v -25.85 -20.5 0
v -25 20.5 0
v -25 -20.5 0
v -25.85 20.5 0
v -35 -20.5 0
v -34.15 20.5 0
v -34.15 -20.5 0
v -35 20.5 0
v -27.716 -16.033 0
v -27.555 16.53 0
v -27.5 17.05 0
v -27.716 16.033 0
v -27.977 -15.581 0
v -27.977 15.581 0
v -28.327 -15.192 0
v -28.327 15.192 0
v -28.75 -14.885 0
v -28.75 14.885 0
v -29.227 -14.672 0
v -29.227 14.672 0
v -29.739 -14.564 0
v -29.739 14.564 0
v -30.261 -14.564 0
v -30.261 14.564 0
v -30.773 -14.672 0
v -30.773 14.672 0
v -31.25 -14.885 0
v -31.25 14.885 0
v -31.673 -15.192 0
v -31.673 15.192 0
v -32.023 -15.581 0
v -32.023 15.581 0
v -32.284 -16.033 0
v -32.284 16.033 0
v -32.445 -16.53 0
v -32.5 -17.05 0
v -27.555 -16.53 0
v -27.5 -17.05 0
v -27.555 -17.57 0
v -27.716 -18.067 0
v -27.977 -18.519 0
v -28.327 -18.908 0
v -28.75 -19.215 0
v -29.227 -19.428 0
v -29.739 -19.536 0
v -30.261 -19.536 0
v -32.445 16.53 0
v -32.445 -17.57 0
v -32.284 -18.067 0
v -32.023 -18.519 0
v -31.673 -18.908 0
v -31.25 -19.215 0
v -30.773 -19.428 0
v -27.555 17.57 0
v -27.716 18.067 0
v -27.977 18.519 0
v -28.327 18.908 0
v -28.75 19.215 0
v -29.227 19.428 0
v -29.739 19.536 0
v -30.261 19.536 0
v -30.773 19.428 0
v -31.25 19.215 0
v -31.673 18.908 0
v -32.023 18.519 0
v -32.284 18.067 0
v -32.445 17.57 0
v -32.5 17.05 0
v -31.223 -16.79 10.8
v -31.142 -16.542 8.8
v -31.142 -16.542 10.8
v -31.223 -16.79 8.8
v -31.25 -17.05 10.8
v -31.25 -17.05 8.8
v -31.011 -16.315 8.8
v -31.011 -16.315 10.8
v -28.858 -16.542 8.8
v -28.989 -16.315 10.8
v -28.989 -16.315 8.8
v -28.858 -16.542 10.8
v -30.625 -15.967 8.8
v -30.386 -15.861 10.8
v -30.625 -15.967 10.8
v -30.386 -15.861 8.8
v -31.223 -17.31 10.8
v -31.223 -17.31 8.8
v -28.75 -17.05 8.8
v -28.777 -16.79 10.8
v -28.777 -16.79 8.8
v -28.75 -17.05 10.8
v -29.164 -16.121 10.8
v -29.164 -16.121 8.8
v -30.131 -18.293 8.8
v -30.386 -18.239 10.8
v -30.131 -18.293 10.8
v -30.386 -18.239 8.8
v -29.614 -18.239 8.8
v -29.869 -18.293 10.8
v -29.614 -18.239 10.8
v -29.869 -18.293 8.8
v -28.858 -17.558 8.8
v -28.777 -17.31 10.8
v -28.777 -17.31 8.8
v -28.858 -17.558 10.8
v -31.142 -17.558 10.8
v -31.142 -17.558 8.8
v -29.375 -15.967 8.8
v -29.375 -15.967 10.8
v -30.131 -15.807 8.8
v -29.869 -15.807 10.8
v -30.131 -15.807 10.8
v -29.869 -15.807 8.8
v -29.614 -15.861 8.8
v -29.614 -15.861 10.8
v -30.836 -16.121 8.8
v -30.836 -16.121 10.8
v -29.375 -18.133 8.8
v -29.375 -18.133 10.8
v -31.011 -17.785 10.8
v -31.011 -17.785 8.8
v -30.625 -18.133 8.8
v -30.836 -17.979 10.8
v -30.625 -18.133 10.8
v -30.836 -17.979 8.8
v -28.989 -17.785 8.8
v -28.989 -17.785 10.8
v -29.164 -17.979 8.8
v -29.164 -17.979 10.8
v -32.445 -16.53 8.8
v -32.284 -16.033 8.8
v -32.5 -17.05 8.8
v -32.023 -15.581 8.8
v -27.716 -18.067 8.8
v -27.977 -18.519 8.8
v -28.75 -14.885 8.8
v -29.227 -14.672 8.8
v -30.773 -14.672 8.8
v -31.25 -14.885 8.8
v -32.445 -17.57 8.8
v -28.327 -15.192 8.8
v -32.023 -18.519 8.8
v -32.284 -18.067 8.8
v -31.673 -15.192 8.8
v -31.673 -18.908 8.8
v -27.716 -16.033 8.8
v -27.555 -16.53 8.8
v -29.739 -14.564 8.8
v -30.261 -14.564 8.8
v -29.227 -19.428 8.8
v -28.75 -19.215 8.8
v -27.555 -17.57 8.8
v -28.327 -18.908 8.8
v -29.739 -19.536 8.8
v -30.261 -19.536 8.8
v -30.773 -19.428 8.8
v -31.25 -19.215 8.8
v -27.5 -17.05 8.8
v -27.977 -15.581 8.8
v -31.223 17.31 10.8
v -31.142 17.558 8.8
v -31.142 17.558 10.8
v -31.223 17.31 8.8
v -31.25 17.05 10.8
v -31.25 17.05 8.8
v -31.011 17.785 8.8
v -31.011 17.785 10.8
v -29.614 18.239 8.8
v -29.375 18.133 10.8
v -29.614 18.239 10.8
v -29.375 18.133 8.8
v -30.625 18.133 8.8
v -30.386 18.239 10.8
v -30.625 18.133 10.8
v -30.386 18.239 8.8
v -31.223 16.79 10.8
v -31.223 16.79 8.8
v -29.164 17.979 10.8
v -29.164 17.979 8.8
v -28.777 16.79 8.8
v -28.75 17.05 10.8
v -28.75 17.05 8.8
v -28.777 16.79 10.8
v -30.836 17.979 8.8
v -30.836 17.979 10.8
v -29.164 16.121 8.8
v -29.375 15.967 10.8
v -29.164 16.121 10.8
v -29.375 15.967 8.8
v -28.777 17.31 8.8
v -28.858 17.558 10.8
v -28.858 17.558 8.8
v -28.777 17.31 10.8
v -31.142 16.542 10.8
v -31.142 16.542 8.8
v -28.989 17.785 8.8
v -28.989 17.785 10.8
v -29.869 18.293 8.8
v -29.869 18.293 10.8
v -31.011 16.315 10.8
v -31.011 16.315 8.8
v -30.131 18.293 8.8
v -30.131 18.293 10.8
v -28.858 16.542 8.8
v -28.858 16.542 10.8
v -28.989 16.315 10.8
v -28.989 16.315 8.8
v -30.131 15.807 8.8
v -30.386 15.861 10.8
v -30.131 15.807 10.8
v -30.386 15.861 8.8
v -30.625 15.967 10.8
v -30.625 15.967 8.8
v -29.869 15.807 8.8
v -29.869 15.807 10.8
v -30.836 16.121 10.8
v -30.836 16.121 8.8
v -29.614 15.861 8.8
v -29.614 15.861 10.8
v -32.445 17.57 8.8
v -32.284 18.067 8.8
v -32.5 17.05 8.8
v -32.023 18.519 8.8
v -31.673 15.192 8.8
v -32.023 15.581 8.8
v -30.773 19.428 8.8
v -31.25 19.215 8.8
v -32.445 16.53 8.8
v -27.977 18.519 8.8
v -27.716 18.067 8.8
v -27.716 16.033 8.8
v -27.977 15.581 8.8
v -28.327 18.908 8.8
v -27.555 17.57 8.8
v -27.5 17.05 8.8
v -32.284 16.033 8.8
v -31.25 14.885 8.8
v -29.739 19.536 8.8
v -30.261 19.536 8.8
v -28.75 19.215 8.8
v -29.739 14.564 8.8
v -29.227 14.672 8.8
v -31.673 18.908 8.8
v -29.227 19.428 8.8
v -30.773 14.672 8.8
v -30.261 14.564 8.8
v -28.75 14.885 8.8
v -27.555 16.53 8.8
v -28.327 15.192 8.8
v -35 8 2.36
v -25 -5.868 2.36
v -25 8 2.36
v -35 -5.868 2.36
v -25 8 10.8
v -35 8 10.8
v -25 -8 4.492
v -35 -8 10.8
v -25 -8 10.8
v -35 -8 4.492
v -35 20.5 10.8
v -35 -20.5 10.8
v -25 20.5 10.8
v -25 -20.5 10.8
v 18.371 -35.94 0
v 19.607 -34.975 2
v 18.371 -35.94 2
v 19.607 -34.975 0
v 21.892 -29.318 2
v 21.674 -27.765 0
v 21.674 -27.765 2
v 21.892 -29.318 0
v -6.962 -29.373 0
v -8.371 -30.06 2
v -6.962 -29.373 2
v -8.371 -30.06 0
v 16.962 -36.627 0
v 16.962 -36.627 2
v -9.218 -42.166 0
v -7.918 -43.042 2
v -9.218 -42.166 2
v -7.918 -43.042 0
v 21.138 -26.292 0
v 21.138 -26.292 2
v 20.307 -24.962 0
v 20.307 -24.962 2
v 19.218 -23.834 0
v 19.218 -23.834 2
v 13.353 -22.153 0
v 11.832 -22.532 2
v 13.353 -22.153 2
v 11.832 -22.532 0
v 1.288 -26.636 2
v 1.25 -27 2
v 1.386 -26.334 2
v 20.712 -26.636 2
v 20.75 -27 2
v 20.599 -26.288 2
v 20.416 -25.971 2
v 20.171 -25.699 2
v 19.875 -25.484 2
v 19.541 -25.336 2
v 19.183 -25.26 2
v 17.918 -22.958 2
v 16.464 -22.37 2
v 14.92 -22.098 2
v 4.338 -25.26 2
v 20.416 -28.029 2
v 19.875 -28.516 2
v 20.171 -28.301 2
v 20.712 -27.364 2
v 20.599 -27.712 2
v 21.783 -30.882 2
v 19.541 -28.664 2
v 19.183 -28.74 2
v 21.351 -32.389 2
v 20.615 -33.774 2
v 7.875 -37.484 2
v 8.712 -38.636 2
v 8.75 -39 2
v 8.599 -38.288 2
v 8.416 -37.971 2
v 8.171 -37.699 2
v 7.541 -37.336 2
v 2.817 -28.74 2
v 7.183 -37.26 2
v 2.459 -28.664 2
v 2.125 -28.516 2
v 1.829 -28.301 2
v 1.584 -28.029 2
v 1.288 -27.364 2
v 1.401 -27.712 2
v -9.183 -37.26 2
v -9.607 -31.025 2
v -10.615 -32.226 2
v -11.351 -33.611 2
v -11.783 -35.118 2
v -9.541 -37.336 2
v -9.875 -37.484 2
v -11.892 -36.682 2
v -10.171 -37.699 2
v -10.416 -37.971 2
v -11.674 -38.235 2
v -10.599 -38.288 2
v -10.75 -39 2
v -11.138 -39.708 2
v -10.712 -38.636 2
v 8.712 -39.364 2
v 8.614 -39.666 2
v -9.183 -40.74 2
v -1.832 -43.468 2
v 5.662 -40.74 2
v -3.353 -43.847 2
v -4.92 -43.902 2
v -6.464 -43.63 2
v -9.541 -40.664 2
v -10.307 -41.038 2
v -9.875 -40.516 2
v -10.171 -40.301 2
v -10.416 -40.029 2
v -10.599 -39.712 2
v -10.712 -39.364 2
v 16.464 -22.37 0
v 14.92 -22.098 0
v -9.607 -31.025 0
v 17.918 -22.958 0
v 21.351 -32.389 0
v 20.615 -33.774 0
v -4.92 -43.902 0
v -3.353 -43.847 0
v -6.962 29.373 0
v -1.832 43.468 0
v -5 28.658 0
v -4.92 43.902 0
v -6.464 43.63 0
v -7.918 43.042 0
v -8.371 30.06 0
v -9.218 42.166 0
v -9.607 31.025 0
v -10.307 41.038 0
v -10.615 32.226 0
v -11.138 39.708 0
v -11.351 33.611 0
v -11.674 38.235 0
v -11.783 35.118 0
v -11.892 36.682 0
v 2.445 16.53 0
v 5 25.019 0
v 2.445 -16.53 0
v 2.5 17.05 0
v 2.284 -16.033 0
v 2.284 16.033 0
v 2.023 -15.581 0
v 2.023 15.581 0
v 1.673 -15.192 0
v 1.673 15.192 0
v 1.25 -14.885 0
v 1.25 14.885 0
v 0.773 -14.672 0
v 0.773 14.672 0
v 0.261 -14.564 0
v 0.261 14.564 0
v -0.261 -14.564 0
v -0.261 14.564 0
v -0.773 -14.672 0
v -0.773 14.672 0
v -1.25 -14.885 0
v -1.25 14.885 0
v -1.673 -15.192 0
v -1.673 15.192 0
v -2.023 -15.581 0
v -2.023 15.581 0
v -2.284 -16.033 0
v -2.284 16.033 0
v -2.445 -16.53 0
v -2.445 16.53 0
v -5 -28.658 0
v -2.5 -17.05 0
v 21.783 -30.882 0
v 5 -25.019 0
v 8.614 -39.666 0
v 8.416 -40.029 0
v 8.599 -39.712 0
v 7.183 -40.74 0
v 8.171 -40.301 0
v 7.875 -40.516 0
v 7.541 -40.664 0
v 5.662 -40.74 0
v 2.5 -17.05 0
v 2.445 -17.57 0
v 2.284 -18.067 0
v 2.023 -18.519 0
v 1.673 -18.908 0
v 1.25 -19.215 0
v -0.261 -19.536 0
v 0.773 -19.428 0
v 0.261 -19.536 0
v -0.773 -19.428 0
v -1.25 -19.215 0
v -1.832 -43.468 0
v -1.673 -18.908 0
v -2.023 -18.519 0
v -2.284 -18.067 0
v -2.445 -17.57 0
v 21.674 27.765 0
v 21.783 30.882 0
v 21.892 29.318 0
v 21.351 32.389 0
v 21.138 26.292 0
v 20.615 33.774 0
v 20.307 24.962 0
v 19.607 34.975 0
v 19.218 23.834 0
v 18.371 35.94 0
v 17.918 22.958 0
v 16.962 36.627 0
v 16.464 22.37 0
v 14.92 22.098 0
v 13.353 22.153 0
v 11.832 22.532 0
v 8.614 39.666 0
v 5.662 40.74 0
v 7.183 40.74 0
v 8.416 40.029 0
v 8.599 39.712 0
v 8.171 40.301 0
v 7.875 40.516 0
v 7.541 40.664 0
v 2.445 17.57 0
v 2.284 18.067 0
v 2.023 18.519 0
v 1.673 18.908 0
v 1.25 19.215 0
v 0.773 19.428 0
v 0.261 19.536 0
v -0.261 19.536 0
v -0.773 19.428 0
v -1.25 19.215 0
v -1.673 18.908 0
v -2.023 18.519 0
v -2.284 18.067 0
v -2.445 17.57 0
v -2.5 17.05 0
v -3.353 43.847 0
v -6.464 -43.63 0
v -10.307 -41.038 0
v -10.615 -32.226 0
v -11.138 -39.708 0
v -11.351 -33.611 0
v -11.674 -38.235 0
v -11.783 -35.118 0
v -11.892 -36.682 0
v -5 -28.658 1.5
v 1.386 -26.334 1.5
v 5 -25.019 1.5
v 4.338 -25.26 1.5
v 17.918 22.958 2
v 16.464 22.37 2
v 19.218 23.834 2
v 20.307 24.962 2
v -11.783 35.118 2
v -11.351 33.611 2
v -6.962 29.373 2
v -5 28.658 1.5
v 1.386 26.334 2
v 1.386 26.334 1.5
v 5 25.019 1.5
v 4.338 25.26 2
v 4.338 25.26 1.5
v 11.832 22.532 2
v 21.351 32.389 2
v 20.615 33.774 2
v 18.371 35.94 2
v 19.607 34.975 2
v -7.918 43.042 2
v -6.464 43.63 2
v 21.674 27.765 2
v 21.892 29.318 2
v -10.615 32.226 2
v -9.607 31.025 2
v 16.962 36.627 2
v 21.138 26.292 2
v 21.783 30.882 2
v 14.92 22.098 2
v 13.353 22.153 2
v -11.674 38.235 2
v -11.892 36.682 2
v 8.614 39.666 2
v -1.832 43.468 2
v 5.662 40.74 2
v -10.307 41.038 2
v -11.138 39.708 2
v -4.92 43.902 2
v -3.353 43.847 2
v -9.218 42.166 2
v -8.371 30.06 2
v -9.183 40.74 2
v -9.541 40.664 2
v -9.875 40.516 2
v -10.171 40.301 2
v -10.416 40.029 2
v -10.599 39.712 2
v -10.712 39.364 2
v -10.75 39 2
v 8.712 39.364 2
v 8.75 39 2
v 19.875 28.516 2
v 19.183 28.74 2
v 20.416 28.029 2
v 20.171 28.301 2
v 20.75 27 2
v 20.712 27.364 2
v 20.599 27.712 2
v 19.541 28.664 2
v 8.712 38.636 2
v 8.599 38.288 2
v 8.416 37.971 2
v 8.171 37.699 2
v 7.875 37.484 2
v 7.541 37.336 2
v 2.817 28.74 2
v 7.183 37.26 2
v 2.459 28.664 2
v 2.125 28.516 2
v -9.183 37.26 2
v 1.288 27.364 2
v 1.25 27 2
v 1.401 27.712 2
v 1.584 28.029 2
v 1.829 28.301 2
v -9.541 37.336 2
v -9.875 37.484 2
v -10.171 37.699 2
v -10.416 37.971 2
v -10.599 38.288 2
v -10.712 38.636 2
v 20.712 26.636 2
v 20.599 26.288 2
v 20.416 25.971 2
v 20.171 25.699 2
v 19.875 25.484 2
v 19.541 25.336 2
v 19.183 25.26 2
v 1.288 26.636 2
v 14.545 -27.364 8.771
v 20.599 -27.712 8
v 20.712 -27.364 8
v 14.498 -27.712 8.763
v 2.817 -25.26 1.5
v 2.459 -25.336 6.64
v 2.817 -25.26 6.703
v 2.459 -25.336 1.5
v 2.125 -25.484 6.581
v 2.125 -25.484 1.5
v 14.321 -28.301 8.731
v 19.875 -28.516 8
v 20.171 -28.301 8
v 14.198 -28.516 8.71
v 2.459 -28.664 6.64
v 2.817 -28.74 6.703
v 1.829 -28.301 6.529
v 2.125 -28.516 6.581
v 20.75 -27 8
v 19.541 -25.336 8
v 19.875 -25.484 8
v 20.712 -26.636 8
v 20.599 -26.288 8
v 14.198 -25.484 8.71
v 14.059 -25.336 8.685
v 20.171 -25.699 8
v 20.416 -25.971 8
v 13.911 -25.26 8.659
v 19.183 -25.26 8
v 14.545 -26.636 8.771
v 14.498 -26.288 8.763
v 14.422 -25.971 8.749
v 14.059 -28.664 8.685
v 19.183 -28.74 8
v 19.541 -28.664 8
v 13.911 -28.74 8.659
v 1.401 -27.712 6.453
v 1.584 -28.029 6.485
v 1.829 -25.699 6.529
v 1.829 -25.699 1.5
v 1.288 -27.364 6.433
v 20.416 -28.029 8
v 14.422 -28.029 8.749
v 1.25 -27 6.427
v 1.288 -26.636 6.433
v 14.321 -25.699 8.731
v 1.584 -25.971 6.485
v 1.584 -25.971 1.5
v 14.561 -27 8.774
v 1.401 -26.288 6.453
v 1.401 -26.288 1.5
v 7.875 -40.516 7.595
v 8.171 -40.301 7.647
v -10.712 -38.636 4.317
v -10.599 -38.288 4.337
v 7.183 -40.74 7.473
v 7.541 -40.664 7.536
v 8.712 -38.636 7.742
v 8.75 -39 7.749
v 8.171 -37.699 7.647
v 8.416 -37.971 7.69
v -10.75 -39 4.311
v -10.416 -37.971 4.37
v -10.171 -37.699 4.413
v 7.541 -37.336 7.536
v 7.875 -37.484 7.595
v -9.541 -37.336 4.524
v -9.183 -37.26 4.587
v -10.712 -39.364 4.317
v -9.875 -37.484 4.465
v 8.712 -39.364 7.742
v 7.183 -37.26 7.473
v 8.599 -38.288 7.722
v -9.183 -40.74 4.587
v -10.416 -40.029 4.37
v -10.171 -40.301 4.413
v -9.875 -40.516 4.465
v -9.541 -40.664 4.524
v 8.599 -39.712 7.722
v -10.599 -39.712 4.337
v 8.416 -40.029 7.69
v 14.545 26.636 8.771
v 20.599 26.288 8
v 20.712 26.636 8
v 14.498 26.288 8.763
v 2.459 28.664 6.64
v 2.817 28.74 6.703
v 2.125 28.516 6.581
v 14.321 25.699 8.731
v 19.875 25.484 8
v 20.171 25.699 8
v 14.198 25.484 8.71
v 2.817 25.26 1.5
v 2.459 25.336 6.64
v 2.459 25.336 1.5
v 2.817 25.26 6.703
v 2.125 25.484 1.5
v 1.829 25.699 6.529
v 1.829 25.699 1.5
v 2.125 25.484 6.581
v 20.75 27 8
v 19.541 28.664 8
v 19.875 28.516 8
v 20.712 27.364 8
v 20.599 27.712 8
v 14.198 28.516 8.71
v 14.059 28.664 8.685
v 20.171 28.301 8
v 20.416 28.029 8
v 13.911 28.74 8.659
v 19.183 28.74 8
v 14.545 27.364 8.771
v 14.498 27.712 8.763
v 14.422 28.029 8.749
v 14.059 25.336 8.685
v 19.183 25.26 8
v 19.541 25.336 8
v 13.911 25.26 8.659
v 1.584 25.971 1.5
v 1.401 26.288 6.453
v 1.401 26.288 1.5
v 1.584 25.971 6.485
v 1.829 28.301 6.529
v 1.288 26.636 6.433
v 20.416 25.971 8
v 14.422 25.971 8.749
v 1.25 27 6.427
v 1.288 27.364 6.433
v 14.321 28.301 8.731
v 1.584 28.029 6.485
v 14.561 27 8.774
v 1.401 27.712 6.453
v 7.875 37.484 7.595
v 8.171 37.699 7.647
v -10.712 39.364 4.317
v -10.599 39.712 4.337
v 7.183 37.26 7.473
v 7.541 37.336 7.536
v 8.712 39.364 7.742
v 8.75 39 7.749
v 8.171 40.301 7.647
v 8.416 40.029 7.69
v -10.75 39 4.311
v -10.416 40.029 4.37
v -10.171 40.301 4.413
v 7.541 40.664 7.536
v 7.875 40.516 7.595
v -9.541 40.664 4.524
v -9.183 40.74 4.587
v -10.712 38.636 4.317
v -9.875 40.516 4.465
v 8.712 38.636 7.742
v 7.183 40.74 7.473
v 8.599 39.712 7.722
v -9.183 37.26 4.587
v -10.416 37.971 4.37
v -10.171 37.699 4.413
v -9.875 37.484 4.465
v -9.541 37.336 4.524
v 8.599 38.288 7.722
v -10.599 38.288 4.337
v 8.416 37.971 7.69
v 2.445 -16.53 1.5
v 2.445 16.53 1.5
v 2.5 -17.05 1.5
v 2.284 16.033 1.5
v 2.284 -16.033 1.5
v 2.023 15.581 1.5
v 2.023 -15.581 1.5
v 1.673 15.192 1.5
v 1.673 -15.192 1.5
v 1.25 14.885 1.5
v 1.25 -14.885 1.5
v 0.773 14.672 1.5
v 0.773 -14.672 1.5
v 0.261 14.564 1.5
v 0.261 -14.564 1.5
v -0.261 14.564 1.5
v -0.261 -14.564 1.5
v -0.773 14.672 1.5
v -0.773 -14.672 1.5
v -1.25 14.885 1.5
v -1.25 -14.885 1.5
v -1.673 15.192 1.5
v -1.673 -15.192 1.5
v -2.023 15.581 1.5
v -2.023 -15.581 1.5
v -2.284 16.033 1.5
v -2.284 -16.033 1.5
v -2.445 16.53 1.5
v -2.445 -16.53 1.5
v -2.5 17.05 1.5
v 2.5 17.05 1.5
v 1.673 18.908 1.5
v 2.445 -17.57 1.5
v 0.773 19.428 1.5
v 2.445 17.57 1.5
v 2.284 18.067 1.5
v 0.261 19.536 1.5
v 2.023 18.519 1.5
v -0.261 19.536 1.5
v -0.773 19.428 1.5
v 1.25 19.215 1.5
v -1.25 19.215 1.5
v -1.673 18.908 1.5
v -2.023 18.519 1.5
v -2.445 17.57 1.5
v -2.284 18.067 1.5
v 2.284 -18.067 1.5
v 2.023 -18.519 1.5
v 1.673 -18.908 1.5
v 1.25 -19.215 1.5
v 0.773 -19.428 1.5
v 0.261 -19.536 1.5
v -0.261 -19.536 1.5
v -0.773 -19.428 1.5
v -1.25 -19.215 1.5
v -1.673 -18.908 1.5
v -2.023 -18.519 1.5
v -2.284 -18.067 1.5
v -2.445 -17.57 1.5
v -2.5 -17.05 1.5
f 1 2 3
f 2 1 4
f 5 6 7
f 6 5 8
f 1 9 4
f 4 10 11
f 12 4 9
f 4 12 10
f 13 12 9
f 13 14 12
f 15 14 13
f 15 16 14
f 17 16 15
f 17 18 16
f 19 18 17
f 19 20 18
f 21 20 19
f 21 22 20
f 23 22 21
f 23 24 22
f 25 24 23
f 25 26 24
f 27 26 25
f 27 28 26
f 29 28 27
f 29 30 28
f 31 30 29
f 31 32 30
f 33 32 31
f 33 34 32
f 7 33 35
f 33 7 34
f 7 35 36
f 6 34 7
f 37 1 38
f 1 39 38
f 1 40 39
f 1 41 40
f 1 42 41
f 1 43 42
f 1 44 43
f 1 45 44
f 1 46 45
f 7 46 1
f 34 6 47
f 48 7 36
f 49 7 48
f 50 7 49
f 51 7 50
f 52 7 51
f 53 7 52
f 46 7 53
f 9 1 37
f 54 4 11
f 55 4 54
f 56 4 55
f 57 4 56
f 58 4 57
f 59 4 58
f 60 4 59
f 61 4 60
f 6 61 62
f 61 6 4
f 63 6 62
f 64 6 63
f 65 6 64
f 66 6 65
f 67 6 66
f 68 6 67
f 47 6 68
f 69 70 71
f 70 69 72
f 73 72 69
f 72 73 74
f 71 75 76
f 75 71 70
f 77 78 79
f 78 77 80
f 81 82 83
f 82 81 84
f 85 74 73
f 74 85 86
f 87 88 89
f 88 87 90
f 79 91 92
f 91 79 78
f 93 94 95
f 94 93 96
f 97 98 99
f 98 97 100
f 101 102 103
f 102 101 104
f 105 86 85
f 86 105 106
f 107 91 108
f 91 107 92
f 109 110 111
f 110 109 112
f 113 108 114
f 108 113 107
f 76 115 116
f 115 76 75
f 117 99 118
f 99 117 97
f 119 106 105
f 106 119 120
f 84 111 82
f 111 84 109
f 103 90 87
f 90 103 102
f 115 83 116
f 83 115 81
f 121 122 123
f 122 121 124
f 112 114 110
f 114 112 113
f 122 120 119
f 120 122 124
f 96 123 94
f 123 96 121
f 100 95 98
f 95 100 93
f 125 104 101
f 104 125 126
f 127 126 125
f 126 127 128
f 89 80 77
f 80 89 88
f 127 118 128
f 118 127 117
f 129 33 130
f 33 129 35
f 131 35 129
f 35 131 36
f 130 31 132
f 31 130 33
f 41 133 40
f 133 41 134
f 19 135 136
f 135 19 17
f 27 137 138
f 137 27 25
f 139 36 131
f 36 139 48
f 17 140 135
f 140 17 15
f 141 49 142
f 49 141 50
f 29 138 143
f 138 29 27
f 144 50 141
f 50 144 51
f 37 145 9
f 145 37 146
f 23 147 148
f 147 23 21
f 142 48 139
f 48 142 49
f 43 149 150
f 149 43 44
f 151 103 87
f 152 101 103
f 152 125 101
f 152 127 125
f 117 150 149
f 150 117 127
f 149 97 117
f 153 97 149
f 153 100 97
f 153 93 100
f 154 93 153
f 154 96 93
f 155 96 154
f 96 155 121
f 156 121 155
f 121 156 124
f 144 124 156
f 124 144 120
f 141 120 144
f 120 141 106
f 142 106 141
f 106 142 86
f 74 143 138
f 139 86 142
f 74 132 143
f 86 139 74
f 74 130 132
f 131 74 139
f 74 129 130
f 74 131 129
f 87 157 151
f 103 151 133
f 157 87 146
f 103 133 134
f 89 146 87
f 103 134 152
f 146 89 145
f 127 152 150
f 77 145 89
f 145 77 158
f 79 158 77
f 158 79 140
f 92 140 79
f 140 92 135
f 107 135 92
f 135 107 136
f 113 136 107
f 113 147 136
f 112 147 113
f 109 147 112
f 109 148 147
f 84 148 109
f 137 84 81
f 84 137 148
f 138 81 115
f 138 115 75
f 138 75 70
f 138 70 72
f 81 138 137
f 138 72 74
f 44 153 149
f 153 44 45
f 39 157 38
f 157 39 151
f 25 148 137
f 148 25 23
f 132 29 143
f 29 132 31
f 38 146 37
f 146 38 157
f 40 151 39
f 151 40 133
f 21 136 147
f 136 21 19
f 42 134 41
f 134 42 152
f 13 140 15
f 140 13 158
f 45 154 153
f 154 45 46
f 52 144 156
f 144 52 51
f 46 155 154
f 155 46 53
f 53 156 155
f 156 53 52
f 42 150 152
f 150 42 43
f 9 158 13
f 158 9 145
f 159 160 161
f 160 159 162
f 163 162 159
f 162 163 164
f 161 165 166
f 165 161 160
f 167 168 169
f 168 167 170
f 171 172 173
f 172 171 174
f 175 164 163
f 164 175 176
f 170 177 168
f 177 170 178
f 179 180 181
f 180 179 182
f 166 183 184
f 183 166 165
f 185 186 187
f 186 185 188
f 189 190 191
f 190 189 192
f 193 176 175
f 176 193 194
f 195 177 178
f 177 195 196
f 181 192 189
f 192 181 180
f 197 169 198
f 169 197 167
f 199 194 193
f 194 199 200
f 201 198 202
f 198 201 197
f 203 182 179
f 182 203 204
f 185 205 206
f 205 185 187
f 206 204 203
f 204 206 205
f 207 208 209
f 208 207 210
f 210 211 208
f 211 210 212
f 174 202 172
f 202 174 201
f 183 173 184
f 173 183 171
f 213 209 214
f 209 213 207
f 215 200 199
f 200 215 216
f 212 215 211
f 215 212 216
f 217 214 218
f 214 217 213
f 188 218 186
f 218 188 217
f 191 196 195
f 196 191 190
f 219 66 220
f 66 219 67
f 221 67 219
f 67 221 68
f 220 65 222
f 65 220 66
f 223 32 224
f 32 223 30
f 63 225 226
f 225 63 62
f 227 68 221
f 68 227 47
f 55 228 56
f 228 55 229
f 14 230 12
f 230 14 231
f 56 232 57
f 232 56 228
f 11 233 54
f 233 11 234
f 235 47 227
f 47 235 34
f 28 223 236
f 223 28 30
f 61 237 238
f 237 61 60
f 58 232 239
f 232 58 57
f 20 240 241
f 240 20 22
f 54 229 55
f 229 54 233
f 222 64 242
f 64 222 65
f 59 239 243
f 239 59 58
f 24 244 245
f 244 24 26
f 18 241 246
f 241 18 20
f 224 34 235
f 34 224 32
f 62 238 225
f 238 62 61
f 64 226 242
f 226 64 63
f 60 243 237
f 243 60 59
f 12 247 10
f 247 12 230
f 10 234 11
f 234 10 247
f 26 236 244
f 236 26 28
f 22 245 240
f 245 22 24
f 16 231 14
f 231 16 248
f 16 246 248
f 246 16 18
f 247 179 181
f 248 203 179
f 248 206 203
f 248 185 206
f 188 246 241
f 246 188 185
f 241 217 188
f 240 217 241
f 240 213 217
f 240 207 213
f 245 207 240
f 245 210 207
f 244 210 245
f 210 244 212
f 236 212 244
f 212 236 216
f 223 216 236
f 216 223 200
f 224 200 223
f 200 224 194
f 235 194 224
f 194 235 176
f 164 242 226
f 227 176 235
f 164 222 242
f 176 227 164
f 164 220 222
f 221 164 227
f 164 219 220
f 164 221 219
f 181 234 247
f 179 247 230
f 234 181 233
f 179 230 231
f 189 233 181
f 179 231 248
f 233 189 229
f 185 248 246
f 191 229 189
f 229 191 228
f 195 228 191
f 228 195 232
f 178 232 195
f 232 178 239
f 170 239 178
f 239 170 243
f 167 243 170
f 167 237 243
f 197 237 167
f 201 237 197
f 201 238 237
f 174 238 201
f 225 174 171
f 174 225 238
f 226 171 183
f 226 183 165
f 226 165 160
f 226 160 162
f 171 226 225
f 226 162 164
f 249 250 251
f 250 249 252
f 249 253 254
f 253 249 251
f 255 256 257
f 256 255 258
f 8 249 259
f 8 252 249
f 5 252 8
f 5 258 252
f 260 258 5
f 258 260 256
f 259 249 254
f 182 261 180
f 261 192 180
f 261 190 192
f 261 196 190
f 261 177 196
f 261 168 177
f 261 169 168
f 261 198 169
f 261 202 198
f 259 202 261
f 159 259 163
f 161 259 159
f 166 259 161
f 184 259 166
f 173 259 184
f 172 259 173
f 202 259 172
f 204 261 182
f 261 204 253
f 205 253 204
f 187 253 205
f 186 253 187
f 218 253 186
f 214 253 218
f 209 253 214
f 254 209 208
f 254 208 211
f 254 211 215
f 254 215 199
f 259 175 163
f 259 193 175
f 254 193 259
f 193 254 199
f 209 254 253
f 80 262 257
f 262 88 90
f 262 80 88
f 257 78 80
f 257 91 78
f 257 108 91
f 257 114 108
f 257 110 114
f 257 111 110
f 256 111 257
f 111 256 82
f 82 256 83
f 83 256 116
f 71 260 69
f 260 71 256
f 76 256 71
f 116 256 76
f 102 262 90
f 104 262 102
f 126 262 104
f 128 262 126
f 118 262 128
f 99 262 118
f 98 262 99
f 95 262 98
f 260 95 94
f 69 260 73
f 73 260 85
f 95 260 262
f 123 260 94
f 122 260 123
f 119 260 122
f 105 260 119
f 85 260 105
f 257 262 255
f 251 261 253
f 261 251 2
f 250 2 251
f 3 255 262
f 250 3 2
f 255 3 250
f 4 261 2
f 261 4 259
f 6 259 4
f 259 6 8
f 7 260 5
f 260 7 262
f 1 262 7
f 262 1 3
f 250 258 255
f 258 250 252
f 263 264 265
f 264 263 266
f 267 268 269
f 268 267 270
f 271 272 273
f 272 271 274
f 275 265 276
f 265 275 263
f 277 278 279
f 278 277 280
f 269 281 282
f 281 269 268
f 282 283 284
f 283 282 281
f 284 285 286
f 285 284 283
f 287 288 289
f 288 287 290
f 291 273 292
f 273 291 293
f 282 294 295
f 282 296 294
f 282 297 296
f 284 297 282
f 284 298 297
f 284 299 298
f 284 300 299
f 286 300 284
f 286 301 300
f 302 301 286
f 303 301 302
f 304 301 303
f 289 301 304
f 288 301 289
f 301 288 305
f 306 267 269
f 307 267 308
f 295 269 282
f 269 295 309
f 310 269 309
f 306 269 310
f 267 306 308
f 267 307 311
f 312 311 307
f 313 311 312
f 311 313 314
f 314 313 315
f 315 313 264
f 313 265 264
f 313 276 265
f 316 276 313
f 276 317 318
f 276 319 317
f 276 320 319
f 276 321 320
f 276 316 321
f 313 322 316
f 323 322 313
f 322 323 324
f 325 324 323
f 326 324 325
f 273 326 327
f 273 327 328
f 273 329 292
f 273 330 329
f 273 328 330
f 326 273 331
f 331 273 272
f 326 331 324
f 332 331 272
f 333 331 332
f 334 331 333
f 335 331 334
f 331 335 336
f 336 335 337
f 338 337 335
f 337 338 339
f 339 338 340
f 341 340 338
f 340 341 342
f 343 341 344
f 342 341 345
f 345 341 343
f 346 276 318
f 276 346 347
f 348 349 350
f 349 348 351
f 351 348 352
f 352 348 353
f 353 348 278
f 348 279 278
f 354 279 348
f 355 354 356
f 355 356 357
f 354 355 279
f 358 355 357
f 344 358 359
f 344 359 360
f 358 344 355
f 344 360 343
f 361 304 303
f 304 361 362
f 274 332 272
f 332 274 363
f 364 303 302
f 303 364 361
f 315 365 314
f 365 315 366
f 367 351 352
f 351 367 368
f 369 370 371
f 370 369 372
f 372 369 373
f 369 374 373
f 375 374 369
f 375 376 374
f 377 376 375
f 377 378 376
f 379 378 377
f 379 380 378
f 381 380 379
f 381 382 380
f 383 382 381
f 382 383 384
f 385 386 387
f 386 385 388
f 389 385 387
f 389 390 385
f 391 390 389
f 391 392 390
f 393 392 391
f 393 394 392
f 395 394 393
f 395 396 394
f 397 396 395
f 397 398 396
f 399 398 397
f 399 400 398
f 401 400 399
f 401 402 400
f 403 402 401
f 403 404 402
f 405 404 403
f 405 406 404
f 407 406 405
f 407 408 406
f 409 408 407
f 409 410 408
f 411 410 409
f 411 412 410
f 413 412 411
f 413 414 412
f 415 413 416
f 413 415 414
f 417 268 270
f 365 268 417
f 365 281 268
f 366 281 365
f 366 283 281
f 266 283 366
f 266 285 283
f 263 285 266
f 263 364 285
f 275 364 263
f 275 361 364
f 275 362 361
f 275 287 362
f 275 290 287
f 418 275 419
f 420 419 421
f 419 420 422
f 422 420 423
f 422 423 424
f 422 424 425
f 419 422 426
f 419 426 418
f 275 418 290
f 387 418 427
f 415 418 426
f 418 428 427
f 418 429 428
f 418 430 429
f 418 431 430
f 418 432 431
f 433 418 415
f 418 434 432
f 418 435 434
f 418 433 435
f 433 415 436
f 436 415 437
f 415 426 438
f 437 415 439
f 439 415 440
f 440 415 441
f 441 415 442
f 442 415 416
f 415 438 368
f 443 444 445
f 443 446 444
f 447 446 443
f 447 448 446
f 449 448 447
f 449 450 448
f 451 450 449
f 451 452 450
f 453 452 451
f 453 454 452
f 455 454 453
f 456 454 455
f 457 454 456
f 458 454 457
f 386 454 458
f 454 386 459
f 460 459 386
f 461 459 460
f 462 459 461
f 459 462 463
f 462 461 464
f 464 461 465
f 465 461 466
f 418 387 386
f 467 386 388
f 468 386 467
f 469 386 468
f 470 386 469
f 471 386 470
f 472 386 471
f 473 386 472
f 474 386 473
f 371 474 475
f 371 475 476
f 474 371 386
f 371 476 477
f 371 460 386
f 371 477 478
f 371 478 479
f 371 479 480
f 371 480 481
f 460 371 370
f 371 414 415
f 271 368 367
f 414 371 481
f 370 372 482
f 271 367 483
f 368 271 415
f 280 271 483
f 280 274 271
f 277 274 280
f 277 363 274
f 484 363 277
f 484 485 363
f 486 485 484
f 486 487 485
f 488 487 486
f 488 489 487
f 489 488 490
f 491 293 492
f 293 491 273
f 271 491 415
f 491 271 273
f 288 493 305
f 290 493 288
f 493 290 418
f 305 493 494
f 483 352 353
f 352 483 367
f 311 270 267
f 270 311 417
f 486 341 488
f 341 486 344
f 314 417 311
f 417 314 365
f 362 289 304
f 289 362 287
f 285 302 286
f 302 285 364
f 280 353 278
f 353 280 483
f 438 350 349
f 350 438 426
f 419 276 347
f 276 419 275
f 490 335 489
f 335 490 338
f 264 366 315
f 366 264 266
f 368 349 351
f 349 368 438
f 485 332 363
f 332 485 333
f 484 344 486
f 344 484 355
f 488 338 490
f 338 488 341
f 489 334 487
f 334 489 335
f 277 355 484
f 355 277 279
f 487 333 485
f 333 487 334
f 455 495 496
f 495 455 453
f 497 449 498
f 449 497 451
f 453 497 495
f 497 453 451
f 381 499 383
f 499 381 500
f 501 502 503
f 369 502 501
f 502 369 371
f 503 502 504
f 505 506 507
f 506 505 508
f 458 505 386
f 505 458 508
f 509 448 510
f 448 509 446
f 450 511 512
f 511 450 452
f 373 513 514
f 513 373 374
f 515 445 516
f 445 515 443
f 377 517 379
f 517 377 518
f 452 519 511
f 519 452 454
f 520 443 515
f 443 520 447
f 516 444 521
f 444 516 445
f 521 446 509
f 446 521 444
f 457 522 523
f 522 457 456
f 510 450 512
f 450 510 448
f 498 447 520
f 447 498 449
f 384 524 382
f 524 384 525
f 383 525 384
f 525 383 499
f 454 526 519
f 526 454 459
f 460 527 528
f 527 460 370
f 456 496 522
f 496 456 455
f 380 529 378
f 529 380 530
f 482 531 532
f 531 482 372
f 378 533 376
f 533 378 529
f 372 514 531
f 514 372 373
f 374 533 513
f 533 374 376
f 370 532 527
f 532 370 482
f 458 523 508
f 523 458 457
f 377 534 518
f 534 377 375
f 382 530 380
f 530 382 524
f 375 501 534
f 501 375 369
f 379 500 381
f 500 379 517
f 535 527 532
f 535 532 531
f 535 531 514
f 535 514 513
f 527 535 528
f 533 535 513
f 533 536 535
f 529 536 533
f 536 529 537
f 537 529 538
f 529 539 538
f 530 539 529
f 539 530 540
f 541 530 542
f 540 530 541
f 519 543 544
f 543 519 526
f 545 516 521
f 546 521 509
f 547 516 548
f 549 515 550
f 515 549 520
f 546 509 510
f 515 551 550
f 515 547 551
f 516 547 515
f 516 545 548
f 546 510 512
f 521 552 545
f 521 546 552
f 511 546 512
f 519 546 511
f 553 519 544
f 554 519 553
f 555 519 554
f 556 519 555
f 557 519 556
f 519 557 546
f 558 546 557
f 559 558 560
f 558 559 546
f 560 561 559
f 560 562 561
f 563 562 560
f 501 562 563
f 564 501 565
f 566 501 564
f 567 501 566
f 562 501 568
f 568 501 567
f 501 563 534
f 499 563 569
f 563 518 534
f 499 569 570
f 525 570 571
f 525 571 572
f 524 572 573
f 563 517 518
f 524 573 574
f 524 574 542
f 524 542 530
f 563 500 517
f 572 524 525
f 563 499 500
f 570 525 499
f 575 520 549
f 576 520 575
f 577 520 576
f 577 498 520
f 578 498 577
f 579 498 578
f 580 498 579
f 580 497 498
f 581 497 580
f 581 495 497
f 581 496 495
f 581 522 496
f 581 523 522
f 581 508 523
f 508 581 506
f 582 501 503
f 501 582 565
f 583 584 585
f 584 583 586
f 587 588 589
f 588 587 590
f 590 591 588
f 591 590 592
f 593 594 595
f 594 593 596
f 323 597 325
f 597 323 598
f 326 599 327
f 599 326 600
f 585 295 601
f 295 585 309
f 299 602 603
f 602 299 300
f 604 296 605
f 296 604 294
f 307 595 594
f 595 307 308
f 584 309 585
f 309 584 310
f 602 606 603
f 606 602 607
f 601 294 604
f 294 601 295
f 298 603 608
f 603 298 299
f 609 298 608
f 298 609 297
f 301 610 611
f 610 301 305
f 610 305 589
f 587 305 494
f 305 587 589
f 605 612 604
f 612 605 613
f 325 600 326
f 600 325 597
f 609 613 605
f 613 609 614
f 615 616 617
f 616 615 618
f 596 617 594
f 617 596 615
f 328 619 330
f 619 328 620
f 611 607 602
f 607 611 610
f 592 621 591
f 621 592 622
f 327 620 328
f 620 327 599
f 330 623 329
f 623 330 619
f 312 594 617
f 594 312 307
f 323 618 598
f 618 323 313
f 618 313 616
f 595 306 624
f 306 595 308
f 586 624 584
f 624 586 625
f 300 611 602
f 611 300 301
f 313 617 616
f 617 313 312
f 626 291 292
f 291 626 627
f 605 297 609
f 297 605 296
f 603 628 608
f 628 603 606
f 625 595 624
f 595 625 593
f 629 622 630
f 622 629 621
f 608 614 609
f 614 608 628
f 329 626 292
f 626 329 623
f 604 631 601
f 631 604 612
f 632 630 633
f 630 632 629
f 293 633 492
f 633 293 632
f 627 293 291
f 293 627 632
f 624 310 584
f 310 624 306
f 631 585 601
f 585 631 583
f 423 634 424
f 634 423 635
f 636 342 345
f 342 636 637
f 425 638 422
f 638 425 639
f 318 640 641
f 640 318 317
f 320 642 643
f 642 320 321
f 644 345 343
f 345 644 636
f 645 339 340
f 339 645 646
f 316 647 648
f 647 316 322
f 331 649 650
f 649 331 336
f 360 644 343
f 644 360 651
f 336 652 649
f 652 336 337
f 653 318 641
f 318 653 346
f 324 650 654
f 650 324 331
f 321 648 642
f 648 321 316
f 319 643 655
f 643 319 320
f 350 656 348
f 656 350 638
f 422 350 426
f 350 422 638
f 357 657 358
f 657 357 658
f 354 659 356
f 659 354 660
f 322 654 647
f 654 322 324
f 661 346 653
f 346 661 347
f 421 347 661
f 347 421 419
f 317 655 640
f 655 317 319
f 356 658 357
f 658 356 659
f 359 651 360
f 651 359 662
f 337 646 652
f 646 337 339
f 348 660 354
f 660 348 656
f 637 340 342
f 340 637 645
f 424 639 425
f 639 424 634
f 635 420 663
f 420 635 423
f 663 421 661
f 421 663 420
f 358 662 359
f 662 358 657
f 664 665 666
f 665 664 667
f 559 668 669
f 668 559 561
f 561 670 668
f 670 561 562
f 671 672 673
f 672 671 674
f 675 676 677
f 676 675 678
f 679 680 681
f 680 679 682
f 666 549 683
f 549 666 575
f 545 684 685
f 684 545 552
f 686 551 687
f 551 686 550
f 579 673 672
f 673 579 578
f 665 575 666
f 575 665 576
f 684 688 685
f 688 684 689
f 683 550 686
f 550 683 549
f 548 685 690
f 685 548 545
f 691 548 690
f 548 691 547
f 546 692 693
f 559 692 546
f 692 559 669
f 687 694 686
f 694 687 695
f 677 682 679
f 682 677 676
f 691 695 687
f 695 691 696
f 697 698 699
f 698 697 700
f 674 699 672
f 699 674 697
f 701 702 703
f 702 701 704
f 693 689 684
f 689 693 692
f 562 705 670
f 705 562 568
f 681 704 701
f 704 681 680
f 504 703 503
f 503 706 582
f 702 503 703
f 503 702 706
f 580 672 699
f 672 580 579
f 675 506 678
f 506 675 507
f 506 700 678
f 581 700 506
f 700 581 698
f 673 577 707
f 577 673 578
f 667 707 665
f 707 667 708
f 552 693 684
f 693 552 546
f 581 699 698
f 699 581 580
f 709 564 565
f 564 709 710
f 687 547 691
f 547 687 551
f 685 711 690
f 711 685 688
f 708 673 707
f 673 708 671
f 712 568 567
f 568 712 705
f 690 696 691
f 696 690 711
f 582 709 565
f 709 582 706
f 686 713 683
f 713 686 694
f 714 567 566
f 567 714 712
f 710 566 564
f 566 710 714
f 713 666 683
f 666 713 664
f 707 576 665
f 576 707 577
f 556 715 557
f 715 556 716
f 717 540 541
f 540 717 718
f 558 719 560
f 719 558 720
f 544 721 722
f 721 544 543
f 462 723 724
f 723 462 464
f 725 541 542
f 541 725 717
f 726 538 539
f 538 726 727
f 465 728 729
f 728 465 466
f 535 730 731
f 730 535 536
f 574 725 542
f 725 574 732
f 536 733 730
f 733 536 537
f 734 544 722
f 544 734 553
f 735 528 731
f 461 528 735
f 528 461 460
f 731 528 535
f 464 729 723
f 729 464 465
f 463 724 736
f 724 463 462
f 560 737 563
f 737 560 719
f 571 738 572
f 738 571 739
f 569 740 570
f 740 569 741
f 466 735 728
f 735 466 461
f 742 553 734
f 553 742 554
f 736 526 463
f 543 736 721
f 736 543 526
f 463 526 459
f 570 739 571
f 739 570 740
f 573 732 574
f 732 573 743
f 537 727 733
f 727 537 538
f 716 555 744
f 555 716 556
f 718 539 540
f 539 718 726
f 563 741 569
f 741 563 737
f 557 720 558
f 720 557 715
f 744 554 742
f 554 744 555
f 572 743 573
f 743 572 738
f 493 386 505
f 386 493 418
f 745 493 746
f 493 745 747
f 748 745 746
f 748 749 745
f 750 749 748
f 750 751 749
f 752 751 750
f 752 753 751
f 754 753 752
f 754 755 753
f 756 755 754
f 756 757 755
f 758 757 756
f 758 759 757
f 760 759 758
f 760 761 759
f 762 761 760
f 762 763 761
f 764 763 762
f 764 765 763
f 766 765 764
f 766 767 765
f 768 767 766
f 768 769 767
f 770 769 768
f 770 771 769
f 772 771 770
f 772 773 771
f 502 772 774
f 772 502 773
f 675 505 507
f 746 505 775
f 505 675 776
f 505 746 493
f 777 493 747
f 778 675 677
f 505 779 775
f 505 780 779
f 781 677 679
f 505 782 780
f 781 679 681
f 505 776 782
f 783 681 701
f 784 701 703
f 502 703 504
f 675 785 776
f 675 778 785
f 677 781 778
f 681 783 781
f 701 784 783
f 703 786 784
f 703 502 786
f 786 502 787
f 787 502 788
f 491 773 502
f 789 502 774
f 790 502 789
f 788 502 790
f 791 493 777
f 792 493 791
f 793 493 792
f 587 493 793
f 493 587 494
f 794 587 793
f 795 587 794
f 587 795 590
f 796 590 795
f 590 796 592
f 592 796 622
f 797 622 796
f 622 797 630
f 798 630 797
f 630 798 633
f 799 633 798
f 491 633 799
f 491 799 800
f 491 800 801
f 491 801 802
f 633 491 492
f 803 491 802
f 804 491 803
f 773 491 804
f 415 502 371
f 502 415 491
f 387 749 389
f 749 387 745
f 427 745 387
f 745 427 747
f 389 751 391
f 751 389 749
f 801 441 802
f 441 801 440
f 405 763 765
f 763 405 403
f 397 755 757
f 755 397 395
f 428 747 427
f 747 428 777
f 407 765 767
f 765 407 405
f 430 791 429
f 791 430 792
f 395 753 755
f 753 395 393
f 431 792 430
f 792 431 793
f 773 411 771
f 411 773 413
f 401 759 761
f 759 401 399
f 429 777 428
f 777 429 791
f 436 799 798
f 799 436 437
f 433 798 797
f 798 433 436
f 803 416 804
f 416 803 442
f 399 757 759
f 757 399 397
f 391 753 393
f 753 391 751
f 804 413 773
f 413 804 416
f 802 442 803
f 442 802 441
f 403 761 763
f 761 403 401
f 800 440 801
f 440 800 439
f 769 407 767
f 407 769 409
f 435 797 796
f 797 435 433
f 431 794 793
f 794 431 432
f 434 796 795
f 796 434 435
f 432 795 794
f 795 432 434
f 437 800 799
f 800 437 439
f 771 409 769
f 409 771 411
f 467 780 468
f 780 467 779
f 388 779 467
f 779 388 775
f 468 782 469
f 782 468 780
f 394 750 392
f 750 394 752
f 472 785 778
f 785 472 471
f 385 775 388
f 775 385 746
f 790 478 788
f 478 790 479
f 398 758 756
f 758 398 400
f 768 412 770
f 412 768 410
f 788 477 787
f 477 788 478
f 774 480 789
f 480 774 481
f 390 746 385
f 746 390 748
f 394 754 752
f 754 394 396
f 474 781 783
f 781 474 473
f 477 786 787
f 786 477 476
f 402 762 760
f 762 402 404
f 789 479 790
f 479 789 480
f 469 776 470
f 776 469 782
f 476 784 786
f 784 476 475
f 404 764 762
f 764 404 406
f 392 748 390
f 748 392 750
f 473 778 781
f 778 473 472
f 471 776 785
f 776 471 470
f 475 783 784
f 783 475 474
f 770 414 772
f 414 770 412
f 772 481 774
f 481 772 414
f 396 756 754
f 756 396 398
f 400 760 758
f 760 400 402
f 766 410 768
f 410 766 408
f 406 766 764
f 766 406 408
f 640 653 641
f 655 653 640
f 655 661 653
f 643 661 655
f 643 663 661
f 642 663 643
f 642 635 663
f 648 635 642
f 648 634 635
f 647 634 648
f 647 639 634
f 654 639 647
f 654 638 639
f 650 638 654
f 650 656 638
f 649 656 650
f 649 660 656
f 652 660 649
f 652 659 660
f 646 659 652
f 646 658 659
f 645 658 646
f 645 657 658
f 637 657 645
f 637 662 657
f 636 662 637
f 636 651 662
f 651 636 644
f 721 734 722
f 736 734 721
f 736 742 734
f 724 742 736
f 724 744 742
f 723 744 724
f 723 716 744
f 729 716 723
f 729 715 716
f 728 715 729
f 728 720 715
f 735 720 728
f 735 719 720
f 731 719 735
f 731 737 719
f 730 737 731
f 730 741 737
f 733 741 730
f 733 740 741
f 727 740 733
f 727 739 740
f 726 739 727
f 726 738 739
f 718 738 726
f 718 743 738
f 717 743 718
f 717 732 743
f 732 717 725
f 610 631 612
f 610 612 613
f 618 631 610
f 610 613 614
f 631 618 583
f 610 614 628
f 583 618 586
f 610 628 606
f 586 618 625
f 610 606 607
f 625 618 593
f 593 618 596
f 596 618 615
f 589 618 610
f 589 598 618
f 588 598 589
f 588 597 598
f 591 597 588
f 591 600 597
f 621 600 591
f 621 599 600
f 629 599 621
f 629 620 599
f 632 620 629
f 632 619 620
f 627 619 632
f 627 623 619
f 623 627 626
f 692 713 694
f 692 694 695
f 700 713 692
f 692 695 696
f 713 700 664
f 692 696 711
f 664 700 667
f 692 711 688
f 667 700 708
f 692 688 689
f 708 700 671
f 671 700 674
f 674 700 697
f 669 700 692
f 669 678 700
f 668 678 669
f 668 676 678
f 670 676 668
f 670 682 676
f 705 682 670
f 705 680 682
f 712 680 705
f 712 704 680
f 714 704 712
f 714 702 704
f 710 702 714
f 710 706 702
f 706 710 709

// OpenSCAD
// TL250/280 landing gear 10 degrees back - a OpenSCAD 
// Copyright (C) 2016  Gerard Valade

// This program is free software: you can redistribute it and/or modify
// it under the terms of the GNU General Public License as published by
// the Free Software Foundation, either version 3 of the License, or
// (at your option) any later version.

// This program is distributed in the hope that it will be useful,
// but WITHOUT ANY WARRANTY; without even the implied warranty of
// MERCHANTABILITY or FITNESS FOR A PARTICULAR PURPOSE.  See the
// GNU General Public License for more details.

// You should have received a copy of the GNU General Public License
// along with this program.  If not, see <http://www.gnu.org/licenses/>.



$fn = 30;
//         	

width_back=40;
hole_width_back=34.1;
higth=10.8;


module oval_foam(y, rot=70, d=15, h=10.72)
{
	rotate([0, 0, rot]) hull() {
		translate([0, -y*(35-15)/2, 0]) cylinder(d=d, h=h, center=false);
		translate([0, y*(35-15)/2, 0]) cylinder(d=d, h=h, center=false);
	}
}

module back_top( length=10)
{
	module plain() {
		translate([0, 0, 1.5/2+higth]) cube([10, width_back+28, 1.5], center=true);			
		for(y=[-1,1]) {
			translate([5, y*33, higth]) oval_foam(y, y*70, h=2);
		}			
		for(y=[-1,1]) {
			uu= 1.0;
			for(y2=[0:12:20]) {
				translate([4, y*(27+y2), higth]) rotate([y*0,0,0]) {
					rotate([0, 0, y*0]) hull() {
						translate([-y2*uu+15, 0, 0]) cylinder(d=3.5, h=length-2, center=false);
						translate([-y2*uu-1, 0, 0]) cylinder(d=3.5, h=length, center=false);
					}
				}
			}
		}
		
	}
	module hole()
	{
		translate([0, 0, higth/2-2]) cube([16, 16, higth], center=true);			
		for(y=[-1,1]) {
			translate([-4, y*31.5, 0]) oval_foam(y, y*70, h=10.72);
		}			
		for(x=[0]) for(y=[-hole_width_back/2,hole_width_back/2]) {
			translate([x, y, -0.1]) cylinder(d=3, h=20, center=false);
			translate([x, y, 2]) cylinder(d=5, h=20, center=false);
		}
	}
	module trunc(length=200, heigth=20)
	{
		translate([length/2-40, 0, heigth+17.74]) rotate([0, -10, 0]) cube([length, 200, heigth], center=true);
	}
	
	difference()
	{
		plain();
		hole();
		trunc();
	}
}
		
module back_base(length=14)
{
	module plain() {
		translate([0, 0, (higth)/2]) cube([10, width_back+1, higth], center=true);			
	}
	module hole(connector_heigth=8.46)
	{
		translate([0, 0, connector_heigth/2-0.02]) cube([16, 16, connector_heigth], center=true);			
		translate([0, 0, higth+2.1/2]) cube([8.3, width_back+6, 2.1], center=true);			
		
		for(y=[-1,1]) {
			translate([-4, y*31.5, higth]) oval_foam(y, y*70, h=2);
		}			
		for(x=[0]) for(y=[-hole_width_back/2,hole_width_back/2]) {
			translate([x, y, -0.1]) cylinder(d=2.5, h=20, center=false);
			translate([x, y, 2]) cylinder(d=5, h=20, center=false);
		}
	}
	
	difference()
	{
		plain();
		hole();
	}
	translate([0, -8, 8.5]) rotate([45, 0, 0]) cube([10, 3.1, 3.1], center=true);			
}


translate([-30, 0, higth]) rotate([0, 180, 0]) back_base(higth=higth);			
translate([0, 0, -higth]) back_top(higth=higth);			
